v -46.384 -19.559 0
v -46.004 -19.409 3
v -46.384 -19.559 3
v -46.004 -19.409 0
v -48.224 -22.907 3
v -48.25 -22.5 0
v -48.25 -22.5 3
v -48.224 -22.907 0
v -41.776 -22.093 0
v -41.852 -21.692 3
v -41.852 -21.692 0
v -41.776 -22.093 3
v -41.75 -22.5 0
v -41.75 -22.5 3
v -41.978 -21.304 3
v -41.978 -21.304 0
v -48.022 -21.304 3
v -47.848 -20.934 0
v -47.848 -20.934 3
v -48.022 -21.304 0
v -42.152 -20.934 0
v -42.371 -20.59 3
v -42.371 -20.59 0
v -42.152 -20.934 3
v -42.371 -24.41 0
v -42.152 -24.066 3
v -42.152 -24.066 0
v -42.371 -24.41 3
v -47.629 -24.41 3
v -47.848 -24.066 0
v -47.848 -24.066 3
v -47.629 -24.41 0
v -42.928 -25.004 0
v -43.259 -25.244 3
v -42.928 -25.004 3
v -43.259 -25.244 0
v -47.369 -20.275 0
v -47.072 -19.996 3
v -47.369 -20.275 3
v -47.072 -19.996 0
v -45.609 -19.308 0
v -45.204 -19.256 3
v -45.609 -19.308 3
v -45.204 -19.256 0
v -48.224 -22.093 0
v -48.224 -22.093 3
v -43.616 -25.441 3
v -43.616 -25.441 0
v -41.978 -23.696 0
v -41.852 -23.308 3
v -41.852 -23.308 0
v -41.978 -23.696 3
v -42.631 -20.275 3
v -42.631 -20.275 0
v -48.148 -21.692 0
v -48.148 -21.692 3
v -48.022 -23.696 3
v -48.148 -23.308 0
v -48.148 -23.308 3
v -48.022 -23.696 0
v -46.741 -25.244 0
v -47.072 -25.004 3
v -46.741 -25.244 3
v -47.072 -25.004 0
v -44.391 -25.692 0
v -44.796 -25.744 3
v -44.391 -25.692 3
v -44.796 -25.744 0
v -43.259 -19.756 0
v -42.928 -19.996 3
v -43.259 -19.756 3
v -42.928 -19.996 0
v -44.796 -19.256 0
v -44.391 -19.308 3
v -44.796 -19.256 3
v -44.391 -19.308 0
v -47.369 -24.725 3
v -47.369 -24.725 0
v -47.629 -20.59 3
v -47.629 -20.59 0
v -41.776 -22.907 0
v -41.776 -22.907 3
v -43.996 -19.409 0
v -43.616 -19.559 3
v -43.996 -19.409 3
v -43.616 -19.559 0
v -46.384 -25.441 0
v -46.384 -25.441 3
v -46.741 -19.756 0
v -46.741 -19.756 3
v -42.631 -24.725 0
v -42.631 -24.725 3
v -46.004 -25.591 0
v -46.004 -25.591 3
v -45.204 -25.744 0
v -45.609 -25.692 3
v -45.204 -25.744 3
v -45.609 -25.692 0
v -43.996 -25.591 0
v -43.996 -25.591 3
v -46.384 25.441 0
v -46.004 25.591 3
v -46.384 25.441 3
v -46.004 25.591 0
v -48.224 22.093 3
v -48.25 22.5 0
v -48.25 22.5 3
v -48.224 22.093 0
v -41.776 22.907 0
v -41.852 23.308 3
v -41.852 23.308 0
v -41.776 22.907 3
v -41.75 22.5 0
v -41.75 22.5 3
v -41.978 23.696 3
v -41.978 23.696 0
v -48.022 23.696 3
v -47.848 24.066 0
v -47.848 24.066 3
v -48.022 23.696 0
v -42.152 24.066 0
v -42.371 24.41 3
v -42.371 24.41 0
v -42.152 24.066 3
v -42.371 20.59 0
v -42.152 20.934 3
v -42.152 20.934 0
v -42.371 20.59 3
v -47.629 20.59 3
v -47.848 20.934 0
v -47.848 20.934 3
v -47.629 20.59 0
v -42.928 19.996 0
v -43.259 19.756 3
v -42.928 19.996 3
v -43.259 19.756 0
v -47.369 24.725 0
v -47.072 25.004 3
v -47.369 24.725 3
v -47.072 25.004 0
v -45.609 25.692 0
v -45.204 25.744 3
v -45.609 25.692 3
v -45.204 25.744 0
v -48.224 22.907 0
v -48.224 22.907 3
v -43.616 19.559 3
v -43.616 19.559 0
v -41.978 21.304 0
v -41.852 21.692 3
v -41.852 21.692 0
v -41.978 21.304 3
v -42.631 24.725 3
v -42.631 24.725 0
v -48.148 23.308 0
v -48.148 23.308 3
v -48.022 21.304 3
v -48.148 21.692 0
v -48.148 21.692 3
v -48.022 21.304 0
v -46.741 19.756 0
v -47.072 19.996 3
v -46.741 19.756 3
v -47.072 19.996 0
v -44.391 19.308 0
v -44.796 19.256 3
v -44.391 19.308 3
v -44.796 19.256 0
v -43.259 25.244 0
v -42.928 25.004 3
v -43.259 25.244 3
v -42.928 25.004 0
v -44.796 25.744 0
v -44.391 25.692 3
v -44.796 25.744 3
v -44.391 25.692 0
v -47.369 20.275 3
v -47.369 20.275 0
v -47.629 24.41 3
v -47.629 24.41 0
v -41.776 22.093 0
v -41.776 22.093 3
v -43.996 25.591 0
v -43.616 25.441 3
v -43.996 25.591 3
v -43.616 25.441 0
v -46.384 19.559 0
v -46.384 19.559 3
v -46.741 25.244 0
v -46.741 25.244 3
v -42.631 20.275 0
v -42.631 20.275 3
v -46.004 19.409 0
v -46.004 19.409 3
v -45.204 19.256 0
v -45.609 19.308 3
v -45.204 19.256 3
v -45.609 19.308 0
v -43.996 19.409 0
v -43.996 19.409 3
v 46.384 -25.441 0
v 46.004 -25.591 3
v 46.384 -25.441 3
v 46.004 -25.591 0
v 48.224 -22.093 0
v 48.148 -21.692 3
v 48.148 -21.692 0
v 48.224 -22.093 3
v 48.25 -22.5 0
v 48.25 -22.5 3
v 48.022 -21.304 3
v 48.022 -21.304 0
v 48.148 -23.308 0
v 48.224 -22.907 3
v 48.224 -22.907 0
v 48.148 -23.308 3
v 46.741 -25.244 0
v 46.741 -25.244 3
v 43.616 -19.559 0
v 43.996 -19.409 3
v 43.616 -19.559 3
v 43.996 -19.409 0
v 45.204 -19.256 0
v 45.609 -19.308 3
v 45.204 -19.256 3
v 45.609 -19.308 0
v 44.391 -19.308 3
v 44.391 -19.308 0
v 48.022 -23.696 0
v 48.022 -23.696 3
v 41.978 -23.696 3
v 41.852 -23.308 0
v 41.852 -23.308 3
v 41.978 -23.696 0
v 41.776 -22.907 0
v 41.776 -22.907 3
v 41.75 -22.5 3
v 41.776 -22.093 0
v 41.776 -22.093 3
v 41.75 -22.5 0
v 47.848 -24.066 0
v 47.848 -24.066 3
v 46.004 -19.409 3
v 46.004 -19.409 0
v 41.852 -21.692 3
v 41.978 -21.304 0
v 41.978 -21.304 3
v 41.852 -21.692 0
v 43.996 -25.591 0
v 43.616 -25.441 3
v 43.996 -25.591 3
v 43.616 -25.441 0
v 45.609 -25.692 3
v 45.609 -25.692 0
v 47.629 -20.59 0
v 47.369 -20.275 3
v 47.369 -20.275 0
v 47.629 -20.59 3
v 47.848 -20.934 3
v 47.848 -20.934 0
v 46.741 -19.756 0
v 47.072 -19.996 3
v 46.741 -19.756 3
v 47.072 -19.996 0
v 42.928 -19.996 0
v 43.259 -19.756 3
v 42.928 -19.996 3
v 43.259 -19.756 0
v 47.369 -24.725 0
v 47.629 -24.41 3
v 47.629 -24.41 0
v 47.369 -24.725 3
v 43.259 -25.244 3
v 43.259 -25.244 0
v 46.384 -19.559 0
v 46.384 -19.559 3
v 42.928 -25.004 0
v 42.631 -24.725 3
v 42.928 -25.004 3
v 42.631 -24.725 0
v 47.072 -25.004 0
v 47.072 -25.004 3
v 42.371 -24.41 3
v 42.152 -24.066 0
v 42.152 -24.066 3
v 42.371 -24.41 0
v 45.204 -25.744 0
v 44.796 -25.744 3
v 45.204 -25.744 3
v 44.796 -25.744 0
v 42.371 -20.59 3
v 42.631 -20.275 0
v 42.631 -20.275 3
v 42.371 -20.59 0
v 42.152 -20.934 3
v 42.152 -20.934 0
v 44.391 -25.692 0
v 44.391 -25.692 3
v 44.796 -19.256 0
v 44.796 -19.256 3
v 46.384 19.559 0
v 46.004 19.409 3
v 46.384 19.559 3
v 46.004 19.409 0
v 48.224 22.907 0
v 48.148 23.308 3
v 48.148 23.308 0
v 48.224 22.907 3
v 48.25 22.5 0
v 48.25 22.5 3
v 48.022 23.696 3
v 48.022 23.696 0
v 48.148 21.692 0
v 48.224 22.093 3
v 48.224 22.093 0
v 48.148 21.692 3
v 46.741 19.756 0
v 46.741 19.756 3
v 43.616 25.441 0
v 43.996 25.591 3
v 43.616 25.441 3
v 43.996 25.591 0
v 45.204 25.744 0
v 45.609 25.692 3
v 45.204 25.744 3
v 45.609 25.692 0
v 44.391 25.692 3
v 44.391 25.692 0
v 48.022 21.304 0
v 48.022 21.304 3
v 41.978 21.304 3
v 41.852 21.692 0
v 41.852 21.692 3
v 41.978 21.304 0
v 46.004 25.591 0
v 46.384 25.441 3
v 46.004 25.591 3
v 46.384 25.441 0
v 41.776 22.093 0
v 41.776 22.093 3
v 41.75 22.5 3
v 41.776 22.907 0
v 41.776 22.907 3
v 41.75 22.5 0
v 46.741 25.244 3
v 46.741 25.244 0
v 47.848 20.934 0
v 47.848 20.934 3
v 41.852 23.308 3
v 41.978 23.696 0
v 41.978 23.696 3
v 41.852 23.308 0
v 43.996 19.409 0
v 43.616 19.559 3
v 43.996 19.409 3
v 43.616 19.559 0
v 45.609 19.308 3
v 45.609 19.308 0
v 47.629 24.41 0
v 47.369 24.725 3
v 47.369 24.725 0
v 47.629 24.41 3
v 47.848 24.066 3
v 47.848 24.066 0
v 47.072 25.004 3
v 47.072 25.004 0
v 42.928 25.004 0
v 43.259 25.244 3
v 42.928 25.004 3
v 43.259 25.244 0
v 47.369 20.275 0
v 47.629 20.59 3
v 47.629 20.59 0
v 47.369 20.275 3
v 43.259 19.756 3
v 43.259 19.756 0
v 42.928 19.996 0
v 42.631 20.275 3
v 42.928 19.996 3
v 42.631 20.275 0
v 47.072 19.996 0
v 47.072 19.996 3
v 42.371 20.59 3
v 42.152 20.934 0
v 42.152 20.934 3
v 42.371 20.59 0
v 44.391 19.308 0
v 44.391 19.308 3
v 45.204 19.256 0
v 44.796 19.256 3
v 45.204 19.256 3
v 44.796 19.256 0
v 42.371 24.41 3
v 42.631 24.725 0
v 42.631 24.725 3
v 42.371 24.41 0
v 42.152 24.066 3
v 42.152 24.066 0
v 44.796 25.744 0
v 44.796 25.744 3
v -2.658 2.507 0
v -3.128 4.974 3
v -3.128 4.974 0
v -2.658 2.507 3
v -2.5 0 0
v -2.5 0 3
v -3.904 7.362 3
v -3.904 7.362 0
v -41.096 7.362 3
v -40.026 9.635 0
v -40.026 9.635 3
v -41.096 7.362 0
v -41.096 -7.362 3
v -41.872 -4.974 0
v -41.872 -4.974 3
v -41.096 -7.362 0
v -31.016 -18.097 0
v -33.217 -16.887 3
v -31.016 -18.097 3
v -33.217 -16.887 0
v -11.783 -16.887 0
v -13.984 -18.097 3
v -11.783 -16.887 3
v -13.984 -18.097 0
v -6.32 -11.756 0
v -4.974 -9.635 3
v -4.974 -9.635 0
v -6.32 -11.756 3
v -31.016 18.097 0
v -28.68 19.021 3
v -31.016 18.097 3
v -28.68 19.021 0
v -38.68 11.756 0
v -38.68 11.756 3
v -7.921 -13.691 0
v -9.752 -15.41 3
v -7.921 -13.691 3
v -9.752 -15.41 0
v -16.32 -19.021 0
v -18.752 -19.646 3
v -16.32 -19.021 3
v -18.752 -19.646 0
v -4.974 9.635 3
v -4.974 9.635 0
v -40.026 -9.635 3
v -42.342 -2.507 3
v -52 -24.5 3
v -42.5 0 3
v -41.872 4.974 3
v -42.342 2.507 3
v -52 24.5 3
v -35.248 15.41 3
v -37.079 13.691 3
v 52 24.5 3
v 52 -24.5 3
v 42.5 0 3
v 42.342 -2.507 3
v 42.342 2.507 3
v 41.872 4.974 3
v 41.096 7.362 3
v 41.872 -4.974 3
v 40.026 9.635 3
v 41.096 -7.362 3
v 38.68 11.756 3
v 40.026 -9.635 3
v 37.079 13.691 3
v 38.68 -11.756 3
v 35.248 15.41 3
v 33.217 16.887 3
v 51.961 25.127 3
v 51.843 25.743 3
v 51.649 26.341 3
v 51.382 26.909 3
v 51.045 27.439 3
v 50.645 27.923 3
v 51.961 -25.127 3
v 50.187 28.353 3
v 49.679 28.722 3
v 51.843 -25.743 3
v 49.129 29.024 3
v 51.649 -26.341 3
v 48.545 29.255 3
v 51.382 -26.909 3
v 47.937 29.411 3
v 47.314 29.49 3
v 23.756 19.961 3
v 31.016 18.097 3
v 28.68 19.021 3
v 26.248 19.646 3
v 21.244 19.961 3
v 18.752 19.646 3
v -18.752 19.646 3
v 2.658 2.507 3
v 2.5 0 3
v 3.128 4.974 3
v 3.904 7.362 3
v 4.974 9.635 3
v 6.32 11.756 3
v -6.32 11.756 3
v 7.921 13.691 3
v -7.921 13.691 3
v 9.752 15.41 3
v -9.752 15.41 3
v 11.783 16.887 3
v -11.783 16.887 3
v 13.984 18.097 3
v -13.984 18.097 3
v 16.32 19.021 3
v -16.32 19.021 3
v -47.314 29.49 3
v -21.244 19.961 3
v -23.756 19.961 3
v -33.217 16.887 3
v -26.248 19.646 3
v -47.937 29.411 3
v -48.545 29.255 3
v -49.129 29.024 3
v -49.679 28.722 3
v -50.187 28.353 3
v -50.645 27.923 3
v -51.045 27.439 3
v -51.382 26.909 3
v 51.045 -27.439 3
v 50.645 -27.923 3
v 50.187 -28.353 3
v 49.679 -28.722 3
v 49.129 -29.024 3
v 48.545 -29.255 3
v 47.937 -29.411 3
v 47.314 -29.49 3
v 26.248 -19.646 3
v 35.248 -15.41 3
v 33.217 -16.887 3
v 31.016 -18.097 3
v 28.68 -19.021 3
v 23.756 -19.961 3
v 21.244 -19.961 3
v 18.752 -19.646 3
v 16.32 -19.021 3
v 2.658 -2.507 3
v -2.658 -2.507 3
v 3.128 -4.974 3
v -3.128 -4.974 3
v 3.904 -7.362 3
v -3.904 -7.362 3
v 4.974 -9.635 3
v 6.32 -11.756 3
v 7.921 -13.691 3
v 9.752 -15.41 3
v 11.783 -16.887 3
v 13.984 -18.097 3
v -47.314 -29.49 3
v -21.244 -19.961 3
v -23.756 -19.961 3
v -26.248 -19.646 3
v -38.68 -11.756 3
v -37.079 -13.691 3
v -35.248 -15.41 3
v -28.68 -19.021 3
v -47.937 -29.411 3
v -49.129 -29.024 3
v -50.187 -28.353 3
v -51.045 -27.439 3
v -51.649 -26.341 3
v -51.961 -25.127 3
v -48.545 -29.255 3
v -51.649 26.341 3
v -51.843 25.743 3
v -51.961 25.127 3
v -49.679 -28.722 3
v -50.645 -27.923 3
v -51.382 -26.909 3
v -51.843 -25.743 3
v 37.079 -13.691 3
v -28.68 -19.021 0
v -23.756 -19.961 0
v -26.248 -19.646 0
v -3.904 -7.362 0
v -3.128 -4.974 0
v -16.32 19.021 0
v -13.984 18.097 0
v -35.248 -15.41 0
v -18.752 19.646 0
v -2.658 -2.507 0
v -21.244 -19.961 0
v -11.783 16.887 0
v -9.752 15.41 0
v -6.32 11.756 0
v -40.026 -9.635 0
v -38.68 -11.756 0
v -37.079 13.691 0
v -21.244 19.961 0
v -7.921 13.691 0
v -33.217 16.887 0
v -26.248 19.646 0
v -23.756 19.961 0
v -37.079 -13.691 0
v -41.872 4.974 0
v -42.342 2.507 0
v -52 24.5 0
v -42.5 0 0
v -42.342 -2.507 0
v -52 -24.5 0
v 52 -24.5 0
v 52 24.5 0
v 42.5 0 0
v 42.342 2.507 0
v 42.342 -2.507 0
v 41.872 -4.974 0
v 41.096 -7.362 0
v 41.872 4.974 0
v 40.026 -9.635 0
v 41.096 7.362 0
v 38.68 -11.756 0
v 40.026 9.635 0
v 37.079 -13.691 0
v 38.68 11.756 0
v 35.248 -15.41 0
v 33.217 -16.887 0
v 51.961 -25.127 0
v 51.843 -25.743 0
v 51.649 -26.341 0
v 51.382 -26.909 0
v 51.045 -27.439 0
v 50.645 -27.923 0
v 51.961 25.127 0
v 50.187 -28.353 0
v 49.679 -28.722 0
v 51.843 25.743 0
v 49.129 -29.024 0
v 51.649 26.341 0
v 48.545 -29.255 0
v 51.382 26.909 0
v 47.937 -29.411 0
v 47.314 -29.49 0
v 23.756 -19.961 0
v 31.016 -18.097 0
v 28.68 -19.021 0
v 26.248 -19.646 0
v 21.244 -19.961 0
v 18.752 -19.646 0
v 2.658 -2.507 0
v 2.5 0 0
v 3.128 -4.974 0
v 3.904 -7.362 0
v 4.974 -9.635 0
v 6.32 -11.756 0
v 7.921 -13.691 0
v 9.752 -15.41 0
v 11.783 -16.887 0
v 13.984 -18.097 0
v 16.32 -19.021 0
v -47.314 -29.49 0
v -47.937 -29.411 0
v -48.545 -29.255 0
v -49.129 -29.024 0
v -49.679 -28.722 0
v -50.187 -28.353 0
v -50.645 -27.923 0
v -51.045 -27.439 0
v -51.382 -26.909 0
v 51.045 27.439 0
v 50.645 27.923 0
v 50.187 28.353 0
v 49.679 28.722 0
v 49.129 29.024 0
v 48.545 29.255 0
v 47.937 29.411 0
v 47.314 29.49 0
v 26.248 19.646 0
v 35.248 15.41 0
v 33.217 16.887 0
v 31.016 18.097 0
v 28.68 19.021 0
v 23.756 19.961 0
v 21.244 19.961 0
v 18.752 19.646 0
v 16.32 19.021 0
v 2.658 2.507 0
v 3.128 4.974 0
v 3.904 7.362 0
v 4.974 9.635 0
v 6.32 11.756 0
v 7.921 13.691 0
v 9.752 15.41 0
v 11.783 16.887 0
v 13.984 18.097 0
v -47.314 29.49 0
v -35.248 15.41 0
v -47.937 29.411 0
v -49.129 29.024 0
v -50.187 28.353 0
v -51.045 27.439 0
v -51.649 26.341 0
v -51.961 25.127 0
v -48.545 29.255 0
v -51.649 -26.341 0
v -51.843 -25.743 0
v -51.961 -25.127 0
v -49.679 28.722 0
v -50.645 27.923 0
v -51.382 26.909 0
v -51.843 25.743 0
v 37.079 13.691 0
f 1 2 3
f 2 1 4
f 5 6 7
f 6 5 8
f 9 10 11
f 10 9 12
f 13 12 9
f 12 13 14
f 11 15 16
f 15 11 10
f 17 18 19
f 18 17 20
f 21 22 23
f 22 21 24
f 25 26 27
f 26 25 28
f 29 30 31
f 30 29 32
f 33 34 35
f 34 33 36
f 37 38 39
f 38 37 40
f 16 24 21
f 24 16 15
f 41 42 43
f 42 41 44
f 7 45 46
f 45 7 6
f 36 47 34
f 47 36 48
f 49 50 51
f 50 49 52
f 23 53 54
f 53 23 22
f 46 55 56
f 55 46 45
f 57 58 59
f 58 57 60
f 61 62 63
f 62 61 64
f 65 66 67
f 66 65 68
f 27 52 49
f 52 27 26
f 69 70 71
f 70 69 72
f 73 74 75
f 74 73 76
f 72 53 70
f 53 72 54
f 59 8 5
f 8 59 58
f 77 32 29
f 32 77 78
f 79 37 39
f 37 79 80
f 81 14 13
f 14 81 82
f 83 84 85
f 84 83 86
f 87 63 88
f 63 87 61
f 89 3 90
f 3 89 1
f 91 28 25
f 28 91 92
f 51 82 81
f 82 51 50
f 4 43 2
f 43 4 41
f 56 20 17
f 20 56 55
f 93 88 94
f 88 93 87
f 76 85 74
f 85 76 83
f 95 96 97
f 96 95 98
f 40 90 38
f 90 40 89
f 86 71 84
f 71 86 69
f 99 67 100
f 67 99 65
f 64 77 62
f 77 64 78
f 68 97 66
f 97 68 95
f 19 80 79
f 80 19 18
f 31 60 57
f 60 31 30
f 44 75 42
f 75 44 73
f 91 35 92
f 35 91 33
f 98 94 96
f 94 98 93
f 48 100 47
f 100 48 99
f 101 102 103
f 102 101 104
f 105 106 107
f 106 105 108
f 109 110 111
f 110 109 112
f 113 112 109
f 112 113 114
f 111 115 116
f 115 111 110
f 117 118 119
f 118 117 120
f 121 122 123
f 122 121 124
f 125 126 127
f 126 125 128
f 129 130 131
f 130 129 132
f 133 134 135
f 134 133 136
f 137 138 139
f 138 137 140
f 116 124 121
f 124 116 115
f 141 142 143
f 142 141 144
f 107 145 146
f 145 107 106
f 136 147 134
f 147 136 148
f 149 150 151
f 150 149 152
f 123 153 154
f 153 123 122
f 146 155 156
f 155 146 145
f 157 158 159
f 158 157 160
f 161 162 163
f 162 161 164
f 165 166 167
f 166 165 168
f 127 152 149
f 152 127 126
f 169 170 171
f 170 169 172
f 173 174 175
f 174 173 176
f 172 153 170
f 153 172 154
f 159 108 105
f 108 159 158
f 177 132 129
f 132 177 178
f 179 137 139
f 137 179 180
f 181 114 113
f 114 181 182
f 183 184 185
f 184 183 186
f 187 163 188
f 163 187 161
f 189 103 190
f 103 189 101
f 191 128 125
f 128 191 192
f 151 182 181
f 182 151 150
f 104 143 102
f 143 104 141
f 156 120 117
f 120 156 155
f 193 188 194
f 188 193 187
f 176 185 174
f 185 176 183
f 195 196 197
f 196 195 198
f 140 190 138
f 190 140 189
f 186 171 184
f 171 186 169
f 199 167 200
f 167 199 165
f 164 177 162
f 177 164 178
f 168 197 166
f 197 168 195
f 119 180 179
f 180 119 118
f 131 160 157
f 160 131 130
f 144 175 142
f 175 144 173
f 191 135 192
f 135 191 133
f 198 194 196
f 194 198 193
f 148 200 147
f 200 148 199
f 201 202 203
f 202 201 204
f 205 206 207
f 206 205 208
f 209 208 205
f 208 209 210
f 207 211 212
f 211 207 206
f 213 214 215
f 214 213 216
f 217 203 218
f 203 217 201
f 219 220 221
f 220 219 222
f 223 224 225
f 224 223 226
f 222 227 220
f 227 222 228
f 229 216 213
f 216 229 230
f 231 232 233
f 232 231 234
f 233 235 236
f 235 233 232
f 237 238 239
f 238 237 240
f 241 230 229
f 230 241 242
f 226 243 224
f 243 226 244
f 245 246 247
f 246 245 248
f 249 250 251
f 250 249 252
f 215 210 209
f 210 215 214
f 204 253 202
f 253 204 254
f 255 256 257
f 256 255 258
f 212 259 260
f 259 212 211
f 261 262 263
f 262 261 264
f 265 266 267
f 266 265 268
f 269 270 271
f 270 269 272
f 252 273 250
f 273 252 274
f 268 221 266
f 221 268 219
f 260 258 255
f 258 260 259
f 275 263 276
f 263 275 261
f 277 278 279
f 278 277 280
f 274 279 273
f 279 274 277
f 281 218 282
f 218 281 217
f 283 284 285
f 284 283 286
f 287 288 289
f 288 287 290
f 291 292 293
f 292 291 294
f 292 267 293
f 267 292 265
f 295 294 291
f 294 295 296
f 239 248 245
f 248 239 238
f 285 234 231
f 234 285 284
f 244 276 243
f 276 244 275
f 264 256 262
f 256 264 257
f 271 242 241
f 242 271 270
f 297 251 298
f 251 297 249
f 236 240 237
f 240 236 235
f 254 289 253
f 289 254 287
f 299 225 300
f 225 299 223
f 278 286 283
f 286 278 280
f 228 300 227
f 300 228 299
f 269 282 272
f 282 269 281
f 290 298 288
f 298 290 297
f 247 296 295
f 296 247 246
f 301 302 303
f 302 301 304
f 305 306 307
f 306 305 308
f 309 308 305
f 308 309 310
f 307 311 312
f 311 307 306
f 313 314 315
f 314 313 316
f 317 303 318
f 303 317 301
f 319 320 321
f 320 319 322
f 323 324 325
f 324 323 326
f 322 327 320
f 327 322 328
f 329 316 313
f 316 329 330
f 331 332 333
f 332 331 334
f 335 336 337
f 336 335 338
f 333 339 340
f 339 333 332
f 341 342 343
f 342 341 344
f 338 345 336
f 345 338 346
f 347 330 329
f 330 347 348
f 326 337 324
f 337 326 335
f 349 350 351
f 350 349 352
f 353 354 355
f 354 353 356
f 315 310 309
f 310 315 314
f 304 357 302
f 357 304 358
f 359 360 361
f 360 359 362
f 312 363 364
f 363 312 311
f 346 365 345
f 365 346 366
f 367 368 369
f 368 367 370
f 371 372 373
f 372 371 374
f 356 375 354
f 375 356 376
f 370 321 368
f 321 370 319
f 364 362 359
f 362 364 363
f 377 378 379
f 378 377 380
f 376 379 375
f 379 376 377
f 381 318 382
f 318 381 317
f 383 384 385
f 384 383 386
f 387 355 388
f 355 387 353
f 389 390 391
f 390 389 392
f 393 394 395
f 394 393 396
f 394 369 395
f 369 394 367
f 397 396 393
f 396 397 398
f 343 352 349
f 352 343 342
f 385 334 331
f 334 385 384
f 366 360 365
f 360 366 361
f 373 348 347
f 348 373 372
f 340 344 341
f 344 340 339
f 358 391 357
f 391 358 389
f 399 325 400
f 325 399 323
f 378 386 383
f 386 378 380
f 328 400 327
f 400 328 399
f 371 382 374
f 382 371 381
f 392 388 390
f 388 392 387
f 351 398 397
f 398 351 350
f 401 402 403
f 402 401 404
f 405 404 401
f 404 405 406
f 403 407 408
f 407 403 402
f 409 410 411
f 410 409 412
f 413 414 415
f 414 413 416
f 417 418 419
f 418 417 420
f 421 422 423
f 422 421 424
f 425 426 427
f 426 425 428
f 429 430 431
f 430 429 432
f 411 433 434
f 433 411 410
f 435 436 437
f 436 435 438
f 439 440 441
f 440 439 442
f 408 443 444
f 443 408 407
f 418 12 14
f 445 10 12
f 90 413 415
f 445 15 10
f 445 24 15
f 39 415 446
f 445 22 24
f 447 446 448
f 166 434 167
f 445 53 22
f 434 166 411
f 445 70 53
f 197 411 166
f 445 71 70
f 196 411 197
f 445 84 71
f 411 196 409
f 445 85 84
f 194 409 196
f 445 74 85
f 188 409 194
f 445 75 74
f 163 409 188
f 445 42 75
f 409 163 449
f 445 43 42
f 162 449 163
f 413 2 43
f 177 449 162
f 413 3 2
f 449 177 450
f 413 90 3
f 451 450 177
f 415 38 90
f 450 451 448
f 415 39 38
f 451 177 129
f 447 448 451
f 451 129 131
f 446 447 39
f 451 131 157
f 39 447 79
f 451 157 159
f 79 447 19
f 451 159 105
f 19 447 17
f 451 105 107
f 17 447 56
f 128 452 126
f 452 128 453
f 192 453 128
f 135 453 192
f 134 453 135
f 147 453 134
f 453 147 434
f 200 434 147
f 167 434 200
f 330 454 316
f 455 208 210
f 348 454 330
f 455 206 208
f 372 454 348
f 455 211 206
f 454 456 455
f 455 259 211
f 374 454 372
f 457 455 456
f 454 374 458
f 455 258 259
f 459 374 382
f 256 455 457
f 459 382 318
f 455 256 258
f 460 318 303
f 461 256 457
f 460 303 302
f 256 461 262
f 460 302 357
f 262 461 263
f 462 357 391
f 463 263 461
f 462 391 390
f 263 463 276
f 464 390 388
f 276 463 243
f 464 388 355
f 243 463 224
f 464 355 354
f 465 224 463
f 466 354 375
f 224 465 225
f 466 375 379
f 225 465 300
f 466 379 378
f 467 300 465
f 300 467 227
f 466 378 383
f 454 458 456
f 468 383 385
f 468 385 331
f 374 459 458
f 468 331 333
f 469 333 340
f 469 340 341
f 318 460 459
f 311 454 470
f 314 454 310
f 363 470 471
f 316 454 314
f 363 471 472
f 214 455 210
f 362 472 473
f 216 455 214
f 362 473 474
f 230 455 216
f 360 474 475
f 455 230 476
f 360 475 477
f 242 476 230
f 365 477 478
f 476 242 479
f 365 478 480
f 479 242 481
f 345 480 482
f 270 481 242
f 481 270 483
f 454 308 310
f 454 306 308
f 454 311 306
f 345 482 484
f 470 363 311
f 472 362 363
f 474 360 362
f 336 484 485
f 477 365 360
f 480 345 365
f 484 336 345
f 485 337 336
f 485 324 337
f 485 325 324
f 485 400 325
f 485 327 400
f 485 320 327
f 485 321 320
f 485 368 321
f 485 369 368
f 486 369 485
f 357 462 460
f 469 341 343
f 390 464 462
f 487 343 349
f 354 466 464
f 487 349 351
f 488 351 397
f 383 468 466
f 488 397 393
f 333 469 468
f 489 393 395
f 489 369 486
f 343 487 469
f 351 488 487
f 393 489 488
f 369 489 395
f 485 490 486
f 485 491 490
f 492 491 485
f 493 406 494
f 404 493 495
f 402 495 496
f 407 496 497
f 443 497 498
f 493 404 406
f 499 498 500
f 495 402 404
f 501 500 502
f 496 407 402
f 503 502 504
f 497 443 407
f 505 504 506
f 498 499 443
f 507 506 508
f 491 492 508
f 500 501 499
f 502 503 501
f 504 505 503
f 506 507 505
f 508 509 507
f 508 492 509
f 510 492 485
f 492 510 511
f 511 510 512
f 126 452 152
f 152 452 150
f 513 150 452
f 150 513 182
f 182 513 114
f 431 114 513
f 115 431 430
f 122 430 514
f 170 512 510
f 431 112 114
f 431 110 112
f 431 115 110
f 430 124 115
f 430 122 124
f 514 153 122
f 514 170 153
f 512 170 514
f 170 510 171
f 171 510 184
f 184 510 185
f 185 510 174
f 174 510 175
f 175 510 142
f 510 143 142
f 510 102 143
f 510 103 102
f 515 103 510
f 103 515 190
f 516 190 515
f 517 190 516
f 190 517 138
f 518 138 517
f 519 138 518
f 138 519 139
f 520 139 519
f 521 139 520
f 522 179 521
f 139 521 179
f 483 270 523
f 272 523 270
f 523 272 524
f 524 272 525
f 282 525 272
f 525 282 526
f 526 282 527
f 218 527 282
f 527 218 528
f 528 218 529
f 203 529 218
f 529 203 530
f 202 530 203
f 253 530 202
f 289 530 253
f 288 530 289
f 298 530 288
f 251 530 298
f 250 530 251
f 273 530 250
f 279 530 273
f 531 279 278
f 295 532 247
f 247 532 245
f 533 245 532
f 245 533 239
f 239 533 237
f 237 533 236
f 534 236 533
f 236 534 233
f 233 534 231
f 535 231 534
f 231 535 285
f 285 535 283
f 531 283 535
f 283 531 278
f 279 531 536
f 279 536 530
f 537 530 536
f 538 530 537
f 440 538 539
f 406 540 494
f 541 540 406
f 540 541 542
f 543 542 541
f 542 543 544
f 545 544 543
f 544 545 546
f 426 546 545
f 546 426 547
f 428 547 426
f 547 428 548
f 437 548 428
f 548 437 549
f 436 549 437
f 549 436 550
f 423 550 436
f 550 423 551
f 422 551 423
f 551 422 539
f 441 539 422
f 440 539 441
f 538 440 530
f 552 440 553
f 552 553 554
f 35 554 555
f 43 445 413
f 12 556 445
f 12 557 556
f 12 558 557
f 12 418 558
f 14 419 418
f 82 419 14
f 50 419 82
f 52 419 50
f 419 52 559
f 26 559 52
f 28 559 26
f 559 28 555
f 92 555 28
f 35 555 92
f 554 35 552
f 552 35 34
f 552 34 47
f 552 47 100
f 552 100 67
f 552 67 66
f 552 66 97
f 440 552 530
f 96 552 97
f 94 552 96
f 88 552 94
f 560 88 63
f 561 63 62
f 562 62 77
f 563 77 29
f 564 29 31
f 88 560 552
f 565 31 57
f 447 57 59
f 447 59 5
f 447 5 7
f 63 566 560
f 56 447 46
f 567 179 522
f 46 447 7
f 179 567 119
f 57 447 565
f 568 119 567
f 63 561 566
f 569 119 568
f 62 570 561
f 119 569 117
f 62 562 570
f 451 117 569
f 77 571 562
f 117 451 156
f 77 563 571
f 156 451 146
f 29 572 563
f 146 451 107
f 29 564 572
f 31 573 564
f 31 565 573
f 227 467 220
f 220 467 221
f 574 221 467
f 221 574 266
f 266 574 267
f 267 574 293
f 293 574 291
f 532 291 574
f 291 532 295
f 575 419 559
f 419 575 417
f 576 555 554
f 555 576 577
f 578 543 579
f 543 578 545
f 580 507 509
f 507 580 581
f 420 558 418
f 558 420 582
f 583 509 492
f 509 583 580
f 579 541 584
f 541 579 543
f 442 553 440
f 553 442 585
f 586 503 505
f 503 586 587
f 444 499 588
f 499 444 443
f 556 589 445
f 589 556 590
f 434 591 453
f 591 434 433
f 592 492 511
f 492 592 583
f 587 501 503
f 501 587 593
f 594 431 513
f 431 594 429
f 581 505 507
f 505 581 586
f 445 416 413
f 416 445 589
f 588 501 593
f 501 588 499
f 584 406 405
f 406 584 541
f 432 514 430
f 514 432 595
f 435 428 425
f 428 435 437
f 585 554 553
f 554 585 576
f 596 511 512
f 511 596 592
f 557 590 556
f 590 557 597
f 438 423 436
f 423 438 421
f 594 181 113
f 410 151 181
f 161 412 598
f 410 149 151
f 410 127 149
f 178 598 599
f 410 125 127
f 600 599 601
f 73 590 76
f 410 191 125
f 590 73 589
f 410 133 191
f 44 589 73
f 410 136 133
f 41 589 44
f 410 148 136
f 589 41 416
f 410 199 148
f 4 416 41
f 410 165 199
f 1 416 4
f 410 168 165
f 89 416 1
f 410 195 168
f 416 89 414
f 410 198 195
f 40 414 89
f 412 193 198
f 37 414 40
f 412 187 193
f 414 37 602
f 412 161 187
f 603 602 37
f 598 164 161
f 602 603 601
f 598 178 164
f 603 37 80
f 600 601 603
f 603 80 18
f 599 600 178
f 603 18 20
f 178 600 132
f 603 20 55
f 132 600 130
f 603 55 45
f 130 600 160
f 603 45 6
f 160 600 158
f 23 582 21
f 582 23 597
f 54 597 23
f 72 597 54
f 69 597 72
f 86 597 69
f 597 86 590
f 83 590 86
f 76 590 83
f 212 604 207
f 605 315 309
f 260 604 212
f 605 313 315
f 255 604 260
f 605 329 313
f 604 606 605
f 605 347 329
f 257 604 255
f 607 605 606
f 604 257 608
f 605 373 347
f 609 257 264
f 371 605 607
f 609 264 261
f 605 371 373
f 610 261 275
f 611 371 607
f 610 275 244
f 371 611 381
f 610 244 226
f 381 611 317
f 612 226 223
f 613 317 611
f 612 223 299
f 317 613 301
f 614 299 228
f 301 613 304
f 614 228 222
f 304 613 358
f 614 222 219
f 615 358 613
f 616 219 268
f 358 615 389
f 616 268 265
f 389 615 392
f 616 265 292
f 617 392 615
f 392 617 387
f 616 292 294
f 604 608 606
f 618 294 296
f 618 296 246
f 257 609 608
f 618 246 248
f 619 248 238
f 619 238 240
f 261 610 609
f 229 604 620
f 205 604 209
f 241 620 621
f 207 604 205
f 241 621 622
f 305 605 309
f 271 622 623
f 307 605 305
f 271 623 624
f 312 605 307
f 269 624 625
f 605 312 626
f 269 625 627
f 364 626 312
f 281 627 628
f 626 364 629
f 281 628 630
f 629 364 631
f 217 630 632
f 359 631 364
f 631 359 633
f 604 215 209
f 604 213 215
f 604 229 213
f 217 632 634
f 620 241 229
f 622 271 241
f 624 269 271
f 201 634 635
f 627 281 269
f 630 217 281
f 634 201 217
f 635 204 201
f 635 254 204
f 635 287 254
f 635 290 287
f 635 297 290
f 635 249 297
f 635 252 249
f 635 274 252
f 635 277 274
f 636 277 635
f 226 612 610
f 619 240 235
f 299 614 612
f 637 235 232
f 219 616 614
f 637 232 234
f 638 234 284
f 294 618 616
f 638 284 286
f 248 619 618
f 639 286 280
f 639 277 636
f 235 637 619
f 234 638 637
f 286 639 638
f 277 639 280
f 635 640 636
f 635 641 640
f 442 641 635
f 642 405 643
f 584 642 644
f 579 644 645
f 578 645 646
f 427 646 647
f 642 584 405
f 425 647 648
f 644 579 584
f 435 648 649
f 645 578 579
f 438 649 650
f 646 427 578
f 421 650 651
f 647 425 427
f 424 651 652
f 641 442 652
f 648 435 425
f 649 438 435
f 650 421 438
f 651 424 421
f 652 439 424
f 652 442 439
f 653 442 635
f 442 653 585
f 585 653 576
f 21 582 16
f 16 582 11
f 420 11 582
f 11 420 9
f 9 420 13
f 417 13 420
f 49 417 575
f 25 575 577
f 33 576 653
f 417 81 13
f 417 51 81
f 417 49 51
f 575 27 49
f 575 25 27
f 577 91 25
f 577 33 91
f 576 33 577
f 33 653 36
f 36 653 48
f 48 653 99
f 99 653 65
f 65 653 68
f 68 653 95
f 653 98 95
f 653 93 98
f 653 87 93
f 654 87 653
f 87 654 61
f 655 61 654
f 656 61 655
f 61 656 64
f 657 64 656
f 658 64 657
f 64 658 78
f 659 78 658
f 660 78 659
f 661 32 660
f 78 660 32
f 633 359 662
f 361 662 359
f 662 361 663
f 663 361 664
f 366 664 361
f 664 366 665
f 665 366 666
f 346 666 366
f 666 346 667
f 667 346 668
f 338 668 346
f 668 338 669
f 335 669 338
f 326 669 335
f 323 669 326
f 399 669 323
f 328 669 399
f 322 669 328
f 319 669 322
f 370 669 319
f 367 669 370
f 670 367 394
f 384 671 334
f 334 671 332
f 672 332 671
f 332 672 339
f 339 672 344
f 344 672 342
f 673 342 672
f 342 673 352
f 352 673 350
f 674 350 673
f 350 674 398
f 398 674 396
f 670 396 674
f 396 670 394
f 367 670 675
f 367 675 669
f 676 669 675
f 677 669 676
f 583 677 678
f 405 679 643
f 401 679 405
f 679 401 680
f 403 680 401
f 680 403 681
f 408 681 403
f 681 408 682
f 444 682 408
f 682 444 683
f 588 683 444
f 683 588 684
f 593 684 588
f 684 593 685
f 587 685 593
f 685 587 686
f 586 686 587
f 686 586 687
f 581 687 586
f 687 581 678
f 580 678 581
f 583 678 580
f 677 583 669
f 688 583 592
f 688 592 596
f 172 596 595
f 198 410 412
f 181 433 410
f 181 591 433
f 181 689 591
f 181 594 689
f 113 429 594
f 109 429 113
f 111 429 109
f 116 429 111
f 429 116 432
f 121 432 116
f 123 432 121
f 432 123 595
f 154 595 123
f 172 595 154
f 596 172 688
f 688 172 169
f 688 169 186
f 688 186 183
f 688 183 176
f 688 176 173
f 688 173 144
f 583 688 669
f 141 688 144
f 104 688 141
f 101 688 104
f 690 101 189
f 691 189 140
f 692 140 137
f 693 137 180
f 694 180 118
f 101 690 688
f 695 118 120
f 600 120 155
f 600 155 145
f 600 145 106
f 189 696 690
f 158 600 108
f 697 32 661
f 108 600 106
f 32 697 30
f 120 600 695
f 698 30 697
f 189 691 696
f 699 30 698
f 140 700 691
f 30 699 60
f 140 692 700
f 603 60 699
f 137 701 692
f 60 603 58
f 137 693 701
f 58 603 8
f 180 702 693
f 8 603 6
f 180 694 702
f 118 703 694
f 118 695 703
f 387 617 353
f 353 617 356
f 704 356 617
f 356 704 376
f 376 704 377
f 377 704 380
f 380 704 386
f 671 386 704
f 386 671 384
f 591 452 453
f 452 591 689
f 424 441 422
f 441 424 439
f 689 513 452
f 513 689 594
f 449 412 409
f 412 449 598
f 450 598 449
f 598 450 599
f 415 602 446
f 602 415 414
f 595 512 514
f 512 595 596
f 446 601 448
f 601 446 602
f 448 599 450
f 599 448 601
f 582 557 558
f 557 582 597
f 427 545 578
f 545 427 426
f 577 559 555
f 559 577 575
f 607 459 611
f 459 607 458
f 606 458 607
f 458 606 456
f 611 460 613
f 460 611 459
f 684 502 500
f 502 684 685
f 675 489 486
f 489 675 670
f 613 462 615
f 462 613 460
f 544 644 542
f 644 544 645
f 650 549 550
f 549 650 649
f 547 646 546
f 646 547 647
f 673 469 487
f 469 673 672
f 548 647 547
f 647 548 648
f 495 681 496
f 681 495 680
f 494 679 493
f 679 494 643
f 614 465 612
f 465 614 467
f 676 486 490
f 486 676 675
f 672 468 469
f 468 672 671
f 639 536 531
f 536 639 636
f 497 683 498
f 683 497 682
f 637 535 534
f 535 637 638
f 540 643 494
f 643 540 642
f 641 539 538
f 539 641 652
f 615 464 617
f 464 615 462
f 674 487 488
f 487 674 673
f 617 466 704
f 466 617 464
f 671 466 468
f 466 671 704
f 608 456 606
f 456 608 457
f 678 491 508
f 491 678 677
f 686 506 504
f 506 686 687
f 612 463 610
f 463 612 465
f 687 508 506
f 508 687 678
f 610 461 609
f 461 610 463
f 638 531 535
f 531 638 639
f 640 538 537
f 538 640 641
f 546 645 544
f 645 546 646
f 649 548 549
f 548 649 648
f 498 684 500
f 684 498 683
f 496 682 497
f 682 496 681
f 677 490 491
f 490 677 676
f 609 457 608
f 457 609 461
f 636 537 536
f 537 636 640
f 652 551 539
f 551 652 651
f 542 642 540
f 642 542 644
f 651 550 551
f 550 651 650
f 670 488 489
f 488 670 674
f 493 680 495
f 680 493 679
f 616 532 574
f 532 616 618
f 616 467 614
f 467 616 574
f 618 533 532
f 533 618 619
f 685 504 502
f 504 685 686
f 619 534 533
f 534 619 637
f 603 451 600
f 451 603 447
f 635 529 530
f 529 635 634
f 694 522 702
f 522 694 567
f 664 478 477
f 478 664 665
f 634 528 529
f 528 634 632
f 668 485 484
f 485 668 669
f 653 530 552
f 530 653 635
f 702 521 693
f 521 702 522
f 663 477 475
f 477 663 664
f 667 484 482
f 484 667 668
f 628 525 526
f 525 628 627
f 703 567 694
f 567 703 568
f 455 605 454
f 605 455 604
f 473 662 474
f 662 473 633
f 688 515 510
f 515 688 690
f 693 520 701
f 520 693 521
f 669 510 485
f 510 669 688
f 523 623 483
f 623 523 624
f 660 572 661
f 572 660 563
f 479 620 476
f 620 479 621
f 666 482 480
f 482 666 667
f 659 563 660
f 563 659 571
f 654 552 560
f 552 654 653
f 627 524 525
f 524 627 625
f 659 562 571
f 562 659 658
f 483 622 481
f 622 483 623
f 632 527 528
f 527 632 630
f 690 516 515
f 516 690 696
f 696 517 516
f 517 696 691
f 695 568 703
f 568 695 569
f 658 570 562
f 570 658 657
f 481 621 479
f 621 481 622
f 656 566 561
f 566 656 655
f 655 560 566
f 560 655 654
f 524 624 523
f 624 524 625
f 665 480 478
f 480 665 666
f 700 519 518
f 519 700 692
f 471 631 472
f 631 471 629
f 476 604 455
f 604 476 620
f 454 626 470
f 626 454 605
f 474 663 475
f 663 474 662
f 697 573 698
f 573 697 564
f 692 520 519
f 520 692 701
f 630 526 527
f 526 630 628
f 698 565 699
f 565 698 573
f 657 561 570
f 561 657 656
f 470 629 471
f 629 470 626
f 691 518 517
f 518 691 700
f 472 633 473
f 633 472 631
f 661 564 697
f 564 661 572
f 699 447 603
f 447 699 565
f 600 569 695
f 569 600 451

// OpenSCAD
$fn = 50;


difference() {
	union() {
		hull() {
			translate(v = [-47.0000000000, 24.5000000000, 0]) {
				cylinder(h = 3, r = 5);
			}
			translate(v = [47.0000000000, 24.5000000000, 0]) {
				cylinder(h = 3, r = 5);
			}
			translate(v = [-47.0000000000, -24.5000000000, 0]) {
				cylinder(h = 3, r = 5);
			}
			translate(v = [47.0000000000, -24.5000000000, 0]) {
				cylinder(h = 3, r = 5);
			}
		}
	}
	union() {
		#translate(v = [-45.0000000000, -22.5000000000, -100.0000000000]) {
			cylinder(h = 200, r = 3.2500000000);
		}
		#translate(v = [-45.0000000000, 22.5000000000, -100.0000000000]) {
			cylinder(h = 200, r = 3.2500000000);
		}
		#translate(v = [45.0000000000, -22.5000000000, -100.0000000000]) {
			cylinder(h = 200, r = 3.2500000000);
		}
		#translate(v = [45.0000000000, 22.5000000000, -100.0000000000]) {
			cylinder(h = 200, r = 3.2500000000);
		}
		#translate(v = [-22.5000000000, 0, 0]) {
			cylinder(h = 3, r = 20.0000000000);
		}
		#translate(v = [22.5000000000, 0, 0]) {
			cylinder(h = 3, r = 20.0000000000);
		}
	}
}
